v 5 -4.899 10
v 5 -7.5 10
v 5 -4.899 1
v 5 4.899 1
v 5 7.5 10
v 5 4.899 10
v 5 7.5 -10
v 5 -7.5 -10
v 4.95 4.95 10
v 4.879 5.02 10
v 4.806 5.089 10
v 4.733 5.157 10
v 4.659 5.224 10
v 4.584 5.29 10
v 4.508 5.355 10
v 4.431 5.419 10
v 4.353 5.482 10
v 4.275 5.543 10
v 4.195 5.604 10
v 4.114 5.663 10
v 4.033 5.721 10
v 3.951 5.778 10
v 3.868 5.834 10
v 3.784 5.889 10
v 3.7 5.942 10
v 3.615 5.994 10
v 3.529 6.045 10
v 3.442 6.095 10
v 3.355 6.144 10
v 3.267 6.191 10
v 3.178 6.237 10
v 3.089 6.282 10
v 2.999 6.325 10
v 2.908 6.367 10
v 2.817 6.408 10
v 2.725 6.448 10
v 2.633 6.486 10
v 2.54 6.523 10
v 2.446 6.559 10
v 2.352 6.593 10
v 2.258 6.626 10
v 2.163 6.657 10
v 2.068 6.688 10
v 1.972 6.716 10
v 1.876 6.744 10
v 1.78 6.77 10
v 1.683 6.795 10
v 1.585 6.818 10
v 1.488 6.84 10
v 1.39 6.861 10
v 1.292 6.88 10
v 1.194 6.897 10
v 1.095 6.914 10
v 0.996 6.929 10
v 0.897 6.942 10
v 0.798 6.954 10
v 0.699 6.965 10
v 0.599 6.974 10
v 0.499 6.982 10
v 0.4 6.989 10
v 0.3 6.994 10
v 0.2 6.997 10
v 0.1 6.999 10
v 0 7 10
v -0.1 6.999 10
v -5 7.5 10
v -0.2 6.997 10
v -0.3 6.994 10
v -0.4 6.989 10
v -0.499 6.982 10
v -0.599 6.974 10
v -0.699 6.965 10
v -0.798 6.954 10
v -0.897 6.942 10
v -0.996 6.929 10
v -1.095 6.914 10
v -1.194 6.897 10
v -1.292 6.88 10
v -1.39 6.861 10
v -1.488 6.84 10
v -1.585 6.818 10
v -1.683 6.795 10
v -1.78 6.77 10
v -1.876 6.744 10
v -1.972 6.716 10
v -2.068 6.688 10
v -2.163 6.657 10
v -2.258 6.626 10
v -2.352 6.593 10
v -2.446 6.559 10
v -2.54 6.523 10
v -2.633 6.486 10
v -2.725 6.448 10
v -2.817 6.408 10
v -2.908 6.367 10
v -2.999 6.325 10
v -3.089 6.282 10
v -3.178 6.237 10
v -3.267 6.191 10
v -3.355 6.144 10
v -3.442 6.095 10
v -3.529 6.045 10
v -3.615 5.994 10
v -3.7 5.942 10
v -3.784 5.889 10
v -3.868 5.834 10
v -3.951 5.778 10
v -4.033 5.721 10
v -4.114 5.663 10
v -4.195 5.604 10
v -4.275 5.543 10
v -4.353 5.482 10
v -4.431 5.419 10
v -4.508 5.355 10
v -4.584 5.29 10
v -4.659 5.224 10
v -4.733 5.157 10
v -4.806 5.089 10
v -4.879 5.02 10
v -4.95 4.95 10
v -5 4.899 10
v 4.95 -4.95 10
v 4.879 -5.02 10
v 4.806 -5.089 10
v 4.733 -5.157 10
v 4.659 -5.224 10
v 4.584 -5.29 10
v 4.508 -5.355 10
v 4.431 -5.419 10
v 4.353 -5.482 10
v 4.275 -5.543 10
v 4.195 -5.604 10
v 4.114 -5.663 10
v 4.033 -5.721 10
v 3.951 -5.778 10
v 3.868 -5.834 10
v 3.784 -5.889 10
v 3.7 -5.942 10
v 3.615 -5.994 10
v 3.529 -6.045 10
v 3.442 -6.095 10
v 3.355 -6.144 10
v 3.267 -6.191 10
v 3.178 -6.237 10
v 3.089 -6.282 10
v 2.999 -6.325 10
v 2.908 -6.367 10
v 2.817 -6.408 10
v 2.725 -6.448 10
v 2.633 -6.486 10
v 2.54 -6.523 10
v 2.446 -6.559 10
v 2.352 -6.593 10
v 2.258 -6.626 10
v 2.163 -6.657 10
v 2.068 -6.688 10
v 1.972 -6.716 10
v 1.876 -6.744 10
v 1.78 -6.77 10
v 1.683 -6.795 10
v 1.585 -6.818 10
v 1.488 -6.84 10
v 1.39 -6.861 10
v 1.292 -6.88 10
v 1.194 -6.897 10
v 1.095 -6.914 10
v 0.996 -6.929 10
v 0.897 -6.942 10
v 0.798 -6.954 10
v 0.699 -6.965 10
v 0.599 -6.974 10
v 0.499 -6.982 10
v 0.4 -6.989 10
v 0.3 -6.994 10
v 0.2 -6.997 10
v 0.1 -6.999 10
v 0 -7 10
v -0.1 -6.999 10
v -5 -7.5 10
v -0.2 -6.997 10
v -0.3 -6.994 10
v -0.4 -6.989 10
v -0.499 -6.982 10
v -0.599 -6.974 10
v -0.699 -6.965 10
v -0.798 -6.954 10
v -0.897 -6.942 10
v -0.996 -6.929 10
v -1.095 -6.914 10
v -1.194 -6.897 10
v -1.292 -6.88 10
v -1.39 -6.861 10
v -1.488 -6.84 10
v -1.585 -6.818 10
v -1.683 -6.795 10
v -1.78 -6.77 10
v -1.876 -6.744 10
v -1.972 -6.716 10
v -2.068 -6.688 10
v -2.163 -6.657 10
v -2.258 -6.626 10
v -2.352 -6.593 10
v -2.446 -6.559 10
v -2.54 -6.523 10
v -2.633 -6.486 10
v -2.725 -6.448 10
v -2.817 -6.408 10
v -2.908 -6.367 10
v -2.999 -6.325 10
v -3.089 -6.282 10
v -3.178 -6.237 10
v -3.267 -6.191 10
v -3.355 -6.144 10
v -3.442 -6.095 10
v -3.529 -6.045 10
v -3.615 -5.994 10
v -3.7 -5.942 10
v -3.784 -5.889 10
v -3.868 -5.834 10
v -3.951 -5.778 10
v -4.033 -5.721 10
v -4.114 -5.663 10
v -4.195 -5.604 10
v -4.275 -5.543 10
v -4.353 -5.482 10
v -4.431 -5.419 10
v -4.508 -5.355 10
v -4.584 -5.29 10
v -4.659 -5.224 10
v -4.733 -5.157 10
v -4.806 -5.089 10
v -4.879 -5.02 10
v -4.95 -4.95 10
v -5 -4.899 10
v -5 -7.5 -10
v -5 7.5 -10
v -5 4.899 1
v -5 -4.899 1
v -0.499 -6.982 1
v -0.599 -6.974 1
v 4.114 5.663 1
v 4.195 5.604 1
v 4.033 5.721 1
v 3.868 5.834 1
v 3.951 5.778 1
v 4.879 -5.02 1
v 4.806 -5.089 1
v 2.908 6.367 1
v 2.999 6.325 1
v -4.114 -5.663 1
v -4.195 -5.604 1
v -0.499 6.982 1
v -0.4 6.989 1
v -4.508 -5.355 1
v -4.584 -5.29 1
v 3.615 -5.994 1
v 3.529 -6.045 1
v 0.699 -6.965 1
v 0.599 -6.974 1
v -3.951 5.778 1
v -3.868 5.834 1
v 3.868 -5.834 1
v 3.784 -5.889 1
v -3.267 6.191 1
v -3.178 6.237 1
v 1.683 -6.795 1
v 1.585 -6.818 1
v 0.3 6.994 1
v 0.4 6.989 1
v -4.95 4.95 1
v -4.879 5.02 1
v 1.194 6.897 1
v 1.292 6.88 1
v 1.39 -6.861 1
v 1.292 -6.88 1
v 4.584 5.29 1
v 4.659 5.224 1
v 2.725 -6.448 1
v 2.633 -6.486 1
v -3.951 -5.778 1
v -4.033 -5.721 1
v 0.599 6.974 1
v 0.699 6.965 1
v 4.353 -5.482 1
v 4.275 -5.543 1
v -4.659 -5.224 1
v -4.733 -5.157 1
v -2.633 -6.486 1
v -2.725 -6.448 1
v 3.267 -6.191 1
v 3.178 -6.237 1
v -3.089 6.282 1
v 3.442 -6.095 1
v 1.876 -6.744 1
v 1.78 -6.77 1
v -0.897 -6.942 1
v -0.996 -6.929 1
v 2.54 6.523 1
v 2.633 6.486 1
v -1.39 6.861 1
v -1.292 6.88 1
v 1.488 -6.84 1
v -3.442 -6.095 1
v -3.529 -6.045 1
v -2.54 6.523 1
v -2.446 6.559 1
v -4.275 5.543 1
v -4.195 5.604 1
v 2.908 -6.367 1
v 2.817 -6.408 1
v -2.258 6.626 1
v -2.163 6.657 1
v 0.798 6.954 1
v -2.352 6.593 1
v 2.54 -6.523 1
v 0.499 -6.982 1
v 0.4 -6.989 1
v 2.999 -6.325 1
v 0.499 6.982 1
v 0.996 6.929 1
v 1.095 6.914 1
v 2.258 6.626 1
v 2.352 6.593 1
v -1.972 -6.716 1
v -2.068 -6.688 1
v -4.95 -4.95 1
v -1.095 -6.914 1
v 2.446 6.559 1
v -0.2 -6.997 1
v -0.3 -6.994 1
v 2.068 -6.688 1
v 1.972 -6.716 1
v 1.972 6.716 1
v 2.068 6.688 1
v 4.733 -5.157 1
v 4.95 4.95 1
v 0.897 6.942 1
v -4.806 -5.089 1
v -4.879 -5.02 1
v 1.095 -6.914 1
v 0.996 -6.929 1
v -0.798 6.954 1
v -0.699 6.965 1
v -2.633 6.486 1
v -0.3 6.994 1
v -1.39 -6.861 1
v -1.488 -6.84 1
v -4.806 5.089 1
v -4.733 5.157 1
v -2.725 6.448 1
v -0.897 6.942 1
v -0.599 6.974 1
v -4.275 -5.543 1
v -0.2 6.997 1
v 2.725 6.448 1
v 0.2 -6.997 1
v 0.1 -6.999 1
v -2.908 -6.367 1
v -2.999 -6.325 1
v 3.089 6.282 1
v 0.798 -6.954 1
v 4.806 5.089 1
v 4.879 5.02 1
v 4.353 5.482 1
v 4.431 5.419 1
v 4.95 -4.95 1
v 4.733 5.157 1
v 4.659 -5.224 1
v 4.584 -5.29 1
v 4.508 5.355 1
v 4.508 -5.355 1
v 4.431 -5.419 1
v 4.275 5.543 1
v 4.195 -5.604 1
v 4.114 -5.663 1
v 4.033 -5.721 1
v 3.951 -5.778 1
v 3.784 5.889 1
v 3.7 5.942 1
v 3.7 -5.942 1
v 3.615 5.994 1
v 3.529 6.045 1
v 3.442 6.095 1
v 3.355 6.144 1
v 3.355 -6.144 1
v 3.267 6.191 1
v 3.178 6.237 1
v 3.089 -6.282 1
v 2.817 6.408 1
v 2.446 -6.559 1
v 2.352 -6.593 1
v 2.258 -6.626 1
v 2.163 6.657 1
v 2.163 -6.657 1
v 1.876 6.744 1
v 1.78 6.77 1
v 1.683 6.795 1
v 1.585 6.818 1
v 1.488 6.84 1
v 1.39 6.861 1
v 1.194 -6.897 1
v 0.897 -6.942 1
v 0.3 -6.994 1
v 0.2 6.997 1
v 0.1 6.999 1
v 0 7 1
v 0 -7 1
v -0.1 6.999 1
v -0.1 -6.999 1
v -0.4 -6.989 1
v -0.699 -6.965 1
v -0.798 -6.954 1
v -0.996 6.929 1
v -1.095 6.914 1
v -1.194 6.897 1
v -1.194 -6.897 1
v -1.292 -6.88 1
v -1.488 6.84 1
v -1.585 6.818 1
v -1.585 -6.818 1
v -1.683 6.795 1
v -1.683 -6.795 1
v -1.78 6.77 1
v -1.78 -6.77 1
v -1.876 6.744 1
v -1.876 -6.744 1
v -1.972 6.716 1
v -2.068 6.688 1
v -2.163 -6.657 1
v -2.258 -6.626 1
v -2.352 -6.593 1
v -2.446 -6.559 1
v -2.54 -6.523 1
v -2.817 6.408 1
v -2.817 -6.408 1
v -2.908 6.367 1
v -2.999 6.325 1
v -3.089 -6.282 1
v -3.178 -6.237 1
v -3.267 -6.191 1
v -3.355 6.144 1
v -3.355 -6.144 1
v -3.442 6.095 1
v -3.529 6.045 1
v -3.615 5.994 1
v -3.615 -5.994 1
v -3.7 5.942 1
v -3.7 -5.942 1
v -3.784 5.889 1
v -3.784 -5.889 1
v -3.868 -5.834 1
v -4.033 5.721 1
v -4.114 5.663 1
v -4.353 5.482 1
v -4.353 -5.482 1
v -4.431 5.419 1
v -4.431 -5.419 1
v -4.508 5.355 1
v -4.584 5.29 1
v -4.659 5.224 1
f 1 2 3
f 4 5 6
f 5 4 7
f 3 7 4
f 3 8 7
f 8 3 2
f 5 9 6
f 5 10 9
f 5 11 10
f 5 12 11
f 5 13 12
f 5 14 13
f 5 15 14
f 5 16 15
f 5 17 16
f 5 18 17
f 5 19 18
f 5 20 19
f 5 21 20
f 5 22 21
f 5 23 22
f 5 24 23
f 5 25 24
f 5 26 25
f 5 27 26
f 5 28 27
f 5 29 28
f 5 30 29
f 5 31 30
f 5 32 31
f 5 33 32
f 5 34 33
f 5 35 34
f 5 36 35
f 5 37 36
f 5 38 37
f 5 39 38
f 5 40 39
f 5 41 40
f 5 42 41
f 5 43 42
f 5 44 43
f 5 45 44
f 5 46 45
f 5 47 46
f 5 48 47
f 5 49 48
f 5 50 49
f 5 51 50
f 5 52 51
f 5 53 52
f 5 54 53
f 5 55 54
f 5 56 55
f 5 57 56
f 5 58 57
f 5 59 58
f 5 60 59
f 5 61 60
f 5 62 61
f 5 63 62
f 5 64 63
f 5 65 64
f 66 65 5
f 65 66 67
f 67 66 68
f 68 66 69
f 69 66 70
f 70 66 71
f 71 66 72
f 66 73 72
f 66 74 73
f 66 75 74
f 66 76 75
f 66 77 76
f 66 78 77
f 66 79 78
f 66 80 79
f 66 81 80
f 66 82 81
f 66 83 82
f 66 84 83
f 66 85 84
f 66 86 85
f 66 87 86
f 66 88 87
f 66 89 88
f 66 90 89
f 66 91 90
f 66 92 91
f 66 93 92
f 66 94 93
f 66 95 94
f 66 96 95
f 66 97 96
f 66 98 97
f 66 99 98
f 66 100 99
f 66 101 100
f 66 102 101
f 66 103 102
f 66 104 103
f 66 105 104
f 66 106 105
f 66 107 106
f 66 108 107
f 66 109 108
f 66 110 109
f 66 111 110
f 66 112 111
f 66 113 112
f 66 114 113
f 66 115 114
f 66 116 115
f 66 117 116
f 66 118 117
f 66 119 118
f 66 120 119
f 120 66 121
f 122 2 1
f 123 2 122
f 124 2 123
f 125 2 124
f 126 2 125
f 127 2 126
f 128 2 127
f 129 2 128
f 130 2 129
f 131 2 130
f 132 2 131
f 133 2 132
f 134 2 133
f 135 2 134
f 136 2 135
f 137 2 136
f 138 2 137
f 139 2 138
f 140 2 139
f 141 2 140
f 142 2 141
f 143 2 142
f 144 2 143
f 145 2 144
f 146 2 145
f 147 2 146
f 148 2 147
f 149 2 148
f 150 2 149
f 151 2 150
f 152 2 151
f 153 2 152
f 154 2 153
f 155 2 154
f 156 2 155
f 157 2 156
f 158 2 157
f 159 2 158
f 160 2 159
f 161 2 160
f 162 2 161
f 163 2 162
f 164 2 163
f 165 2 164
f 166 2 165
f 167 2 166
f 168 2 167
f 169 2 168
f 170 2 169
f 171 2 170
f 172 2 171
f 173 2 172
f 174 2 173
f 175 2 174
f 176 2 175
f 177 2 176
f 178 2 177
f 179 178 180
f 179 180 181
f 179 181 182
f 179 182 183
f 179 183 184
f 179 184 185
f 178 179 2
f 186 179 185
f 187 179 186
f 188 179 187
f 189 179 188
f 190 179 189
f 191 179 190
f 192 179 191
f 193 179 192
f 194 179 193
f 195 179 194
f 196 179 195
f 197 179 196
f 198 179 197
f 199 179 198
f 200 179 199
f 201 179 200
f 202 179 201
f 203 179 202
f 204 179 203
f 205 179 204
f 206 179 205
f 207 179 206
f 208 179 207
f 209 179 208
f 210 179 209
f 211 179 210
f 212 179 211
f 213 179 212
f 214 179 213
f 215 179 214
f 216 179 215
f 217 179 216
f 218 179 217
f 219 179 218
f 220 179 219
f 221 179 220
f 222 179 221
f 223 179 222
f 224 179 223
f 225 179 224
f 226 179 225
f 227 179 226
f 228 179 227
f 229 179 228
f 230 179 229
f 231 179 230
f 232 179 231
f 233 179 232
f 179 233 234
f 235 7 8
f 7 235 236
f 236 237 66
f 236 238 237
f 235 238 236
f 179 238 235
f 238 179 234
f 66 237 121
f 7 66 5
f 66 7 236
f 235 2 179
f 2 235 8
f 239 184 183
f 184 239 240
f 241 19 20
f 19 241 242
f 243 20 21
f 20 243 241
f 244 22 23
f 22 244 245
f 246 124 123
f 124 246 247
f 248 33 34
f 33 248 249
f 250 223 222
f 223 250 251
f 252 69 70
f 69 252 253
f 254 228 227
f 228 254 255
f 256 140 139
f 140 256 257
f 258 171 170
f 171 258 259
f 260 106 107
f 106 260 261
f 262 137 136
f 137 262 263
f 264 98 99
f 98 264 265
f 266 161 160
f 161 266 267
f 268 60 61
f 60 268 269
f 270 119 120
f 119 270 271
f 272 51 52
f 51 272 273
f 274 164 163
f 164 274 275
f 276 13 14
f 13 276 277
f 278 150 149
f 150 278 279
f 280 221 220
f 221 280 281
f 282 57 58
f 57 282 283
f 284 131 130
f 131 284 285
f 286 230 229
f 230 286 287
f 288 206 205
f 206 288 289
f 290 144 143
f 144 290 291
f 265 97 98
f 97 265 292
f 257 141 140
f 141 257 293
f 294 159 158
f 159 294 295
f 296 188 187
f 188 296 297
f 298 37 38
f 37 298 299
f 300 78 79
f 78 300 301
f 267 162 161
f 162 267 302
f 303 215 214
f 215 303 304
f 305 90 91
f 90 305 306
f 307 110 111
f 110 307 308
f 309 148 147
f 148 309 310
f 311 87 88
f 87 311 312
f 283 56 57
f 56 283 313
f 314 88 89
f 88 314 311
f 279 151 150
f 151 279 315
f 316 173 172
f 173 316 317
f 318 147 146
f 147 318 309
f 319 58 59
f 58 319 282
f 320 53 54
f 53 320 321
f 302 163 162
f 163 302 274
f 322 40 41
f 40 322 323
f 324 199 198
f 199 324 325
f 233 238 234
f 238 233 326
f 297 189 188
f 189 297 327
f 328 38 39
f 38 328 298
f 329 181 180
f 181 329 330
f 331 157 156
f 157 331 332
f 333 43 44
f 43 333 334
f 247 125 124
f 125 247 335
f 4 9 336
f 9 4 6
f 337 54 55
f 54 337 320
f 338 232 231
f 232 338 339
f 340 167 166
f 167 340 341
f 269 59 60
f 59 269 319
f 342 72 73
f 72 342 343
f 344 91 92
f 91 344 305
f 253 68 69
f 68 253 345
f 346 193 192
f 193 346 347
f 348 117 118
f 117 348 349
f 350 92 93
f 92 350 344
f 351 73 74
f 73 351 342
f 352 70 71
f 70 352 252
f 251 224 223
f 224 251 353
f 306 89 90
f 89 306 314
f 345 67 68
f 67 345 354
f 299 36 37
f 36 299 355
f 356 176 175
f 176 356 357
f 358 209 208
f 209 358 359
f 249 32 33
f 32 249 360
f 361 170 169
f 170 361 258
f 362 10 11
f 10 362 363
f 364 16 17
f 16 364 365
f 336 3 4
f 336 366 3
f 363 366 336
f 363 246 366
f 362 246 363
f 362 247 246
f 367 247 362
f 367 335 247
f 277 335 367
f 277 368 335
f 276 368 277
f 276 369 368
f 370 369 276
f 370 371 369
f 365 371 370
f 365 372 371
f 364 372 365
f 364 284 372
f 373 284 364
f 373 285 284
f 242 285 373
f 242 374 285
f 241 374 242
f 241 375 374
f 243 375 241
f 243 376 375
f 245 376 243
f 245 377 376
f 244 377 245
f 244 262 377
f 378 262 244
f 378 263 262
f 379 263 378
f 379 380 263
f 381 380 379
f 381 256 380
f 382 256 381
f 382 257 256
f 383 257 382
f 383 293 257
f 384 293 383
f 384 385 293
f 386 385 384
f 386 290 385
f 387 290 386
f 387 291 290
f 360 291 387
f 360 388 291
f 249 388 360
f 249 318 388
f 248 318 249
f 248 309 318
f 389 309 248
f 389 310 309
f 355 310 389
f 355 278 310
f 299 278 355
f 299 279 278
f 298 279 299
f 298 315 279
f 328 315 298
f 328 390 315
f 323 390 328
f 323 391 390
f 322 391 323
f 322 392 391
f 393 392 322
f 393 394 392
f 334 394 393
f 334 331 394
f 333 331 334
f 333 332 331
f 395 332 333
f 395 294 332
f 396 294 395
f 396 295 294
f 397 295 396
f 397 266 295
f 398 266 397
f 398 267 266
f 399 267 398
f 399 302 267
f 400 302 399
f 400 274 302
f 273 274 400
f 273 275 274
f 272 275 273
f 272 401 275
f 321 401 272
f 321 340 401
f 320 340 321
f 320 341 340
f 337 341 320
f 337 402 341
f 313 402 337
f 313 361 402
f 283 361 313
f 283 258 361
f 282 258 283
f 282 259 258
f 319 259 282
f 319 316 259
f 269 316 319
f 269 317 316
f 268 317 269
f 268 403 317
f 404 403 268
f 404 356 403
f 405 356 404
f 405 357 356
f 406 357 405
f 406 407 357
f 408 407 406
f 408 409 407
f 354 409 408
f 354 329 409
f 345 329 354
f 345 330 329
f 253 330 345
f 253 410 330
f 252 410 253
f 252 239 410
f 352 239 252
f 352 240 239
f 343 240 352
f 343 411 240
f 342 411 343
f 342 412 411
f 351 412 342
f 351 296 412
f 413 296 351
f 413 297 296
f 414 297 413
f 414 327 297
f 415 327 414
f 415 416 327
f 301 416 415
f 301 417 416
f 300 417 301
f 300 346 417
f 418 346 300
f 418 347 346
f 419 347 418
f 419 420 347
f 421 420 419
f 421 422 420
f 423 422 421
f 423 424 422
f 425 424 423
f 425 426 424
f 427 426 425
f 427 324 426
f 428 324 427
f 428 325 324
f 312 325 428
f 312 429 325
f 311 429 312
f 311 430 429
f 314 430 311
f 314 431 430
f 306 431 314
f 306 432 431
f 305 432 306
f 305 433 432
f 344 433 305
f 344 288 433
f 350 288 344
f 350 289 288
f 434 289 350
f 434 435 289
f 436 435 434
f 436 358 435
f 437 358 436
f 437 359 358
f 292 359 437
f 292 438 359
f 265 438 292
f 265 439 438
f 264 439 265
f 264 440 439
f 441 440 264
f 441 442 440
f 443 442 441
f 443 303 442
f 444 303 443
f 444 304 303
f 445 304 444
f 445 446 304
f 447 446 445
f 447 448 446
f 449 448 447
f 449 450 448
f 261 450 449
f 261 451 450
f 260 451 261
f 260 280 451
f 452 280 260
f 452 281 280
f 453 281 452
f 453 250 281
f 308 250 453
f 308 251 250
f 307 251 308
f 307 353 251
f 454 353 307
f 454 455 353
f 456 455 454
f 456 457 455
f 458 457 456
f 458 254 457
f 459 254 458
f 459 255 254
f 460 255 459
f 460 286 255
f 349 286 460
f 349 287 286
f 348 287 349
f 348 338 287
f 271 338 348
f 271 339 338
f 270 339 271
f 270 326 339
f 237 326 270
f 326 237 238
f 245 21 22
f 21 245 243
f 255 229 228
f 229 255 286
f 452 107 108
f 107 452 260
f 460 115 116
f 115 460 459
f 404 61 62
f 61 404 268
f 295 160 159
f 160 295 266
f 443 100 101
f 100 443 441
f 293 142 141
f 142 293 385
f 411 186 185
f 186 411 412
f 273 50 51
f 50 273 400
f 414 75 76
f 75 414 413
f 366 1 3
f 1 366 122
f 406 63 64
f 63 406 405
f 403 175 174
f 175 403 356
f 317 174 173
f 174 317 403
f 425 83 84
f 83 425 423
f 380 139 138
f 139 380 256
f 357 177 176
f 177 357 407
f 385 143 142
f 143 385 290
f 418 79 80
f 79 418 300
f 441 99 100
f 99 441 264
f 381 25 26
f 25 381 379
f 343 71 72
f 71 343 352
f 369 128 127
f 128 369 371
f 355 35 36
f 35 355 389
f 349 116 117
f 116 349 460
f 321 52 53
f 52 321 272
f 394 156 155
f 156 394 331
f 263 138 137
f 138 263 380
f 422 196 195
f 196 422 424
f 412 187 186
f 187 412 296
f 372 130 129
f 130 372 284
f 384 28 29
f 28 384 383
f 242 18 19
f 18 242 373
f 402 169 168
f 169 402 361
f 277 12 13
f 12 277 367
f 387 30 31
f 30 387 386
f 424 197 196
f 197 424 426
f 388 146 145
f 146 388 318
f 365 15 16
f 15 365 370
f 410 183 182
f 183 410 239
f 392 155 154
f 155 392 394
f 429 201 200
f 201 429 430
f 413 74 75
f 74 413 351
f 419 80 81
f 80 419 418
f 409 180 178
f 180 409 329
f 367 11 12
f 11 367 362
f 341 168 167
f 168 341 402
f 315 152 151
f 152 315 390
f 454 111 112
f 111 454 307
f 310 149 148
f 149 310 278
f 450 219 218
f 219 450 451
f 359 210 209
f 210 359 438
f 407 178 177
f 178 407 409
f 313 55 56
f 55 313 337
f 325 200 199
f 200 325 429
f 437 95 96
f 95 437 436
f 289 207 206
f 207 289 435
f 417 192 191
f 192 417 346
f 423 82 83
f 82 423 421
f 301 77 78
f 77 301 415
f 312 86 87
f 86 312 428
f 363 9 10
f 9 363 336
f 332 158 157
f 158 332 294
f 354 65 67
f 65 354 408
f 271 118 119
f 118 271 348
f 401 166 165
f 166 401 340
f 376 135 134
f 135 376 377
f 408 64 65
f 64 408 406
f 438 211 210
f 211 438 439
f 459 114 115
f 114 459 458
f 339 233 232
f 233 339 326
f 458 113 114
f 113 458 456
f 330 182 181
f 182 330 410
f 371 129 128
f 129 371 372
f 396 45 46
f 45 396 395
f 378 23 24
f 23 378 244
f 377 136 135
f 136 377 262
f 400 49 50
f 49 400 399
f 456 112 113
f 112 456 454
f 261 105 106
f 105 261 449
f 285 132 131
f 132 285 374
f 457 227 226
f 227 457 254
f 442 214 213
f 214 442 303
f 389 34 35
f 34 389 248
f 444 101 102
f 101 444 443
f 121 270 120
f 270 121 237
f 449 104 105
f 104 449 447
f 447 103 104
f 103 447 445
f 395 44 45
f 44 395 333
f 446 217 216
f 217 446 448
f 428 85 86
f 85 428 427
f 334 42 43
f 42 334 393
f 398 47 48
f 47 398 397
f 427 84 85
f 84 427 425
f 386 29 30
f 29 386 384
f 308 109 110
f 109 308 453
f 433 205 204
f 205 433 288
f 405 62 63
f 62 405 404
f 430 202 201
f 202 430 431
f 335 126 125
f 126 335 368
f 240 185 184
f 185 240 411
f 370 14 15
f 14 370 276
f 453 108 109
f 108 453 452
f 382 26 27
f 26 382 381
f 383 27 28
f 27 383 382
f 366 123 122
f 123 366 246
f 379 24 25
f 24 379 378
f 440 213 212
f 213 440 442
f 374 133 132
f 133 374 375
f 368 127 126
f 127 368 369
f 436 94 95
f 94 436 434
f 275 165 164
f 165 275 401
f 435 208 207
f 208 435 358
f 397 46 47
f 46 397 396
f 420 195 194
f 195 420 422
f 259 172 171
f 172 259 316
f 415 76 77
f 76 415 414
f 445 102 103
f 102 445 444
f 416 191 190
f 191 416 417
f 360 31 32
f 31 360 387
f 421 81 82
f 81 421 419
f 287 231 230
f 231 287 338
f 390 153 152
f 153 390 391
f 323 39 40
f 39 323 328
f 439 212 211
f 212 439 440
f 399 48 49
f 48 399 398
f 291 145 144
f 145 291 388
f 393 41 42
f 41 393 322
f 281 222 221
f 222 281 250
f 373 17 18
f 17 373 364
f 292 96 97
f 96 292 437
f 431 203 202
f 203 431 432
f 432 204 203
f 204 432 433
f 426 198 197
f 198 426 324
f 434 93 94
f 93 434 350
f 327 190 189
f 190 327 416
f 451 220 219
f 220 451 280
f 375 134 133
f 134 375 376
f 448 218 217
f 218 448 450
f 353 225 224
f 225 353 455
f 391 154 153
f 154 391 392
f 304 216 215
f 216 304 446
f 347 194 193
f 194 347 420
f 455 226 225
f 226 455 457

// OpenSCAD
// first design
//shane cunningham
//31-3-2017

//definition
$fa=0.5;
$fs=0.1;

//parameters
myW = 10;
myD = 15;
myH = 20;
cylD = 14;
cylH = 9;


module blockThing()
{
    cube([myW,myD,myH], center=true);
    
}

module cylinderThing()
{
    cylinder(r=cylD/2, h=cylH, center=true);
}

module makeThing()
{
    difference()
    {
        blockThing();
        translate([0,0,myH/2 - cylH/2])
        cylinderThing();
    }
    
}

makeThing();
    
